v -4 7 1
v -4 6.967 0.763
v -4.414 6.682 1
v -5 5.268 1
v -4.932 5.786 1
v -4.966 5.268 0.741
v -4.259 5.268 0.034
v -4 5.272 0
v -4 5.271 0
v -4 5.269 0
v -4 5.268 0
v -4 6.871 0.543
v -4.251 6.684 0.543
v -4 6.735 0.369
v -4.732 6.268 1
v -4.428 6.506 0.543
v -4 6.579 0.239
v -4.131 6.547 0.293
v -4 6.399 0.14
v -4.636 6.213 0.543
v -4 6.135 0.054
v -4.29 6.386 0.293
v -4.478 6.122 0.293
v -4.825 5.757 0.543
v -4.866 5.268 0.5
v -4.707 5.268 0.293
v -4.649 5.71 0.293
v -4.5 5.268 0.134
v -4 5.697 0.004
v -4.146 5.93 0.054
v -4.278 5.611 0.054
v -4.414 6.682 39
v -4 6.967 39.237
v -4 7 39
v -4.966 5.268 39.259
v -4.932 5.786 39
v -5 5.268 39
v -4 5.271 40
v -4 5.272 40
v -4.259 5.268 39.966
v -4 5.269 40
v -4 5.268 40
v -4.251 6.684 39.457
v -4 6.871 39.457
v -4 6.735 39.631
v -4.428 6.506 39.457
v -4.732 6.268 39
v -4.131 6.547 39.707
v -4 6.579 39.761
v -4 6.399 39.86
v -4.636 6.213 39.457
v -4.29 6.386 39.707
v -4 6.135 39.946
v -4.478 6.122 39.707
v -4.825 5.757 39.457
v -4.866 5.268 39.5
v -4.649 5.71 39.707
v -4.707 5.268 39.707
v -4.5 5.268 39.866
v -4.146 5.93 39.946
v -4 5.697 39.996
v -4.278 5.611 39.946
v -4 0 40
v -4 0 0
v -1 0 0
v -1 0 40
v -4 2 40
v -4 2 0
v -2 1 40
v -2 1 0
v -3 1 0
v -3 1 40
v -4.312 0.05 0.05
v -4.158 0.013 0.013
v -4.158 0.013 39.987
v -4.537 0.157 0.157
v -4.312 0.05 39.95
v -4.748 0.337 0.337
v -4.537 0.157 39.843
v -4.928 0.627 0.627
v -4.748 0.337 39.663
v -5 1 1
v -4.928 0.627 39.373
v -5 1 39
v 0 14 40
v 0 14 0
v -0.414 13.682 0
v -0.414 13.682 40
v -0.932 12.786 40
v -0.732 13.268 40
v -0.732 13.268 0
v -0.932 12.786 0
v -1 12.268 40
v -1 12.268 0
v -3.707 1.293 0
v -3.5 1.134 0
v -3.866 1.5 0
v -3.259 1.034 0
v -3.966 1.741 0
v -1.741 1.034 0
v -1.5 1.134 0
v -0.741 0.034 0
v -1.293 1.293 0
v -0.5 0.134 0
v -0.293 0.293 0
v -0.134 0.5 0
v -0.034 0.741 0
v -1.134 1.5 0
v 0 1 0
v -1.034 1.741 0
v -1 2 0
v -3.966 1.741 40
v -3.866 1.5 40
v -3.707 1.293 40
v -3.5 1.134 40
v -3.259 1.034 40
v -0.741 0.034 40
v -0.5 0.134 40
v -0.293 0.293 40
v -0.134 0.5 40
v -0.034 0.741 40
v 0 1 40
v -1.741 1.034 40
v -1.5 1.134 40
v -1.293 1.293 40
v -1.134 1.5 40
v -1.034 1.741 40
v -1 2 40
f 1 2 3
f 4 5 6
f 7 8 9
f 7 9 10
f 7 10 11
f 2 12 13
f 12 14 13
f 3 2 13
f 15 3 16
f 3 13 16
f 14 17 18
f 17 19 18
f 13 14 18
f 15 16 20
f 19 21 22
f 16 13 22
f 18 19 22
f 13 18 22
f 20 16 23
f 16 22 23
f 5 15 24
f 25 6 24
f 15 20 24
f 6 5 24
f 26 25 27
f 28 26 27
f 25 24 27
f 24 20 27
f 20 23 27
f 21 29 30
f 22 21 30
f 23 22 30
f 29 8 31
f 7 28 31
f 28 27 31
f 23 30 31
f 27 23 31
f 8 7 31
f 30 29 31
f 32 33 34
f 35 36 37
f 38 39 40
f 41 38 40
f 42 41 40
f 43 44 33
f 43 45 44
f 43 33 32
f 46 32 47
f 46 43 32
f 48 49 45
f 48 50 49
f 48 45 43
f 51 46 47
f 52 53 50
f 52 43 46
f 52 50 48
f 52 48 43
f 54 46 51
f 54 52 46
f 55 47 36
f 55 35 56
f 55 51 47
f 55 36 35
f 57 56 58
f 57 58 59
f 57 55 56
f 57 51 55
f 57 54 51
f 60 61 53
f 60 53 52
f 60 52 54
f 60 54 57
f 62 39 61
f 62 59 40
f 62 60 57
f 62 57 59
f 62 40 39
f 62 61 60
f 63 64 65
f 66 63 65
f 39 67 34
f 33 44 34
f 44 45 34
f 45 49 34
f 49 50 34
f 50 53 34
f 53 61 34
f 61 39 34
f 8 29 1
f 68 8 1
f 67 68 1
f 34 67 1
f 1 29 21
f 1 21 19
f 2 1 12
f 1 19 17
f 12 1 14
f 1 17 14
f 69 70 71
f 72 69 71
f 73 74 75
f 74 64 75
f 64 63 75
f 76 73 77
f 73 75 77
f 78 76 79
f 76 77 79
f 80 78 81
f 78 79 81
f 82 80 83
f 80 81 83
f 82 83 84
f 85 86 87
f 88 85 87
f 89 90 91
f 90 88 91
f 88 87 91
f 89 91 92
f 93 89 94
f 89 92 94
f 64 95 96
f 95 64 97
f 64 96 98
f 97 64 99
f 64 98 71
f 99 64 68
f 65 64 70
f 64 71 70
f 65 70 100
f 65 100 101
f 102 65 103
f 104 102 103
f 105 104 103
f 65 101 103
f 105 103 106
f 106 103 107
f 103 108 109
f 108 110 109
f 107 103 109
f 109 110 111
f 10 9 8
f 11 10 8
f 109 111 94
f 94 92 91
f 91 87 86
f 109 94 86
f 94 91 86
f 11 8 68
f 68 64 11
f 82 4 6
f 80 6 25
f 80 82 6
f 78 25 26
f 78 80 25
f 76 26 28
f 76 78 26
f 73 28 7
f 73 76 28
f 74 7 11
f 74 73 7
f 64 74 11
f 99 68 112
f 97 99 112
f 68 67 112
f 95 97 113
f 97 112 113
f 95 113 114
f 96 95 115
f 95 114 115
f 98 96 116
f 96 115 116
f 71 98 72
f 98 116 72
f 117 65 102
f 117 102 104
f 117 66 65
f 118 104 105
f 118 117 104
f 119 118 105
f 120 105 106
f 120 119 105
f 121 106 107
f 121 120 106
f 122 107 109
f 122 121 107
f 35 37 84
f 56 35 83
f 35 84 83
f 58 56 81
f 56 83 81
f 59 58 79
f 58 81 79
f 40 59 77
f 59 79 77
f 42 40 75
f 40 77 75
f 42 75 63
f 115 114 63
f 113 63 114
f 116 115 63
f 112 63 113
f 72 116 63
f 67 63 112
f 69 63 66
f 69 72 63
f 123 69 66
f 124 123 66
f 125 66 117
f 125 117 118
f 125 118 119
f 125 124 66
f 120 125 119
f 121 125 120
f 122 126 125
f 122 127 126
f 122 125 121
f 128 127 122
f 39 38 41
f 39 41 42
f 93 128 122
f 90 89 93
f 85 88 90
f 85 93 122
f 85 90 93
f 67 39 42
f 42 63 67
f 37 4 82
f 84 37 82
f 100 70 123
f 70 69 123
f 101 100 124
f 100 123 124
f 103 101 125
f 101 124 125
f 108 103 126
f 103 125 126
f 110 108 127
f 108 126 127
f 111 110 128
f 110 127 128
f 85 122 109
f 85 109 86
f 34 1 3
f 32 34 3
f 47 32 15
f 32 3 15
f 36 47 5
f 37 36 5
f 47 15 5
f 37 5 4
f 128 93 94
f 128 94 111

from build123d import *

# Parameters (mm, degrees)
F1_DEPTH    = 40
F2_T1_DEPTH = 48.6602540378
F3_R        = 0.99999


# Not quite as in the source:
# - a fillet or chamfer that OpenCascade refuses, or shapes differently, is made with other operations: its cross-section is extruded or revolved along the edge and cut away or added
# - a fillet or chamfer is up to 0.001 mm smaller than in the source, because OpenCascade refuses the exact size


with BuildPart() as f1:
    # F0 (on Top) → F1 (new body)
    with BuildSketch(Plane.XY):
        Polygon((-5, 0), (0, 0), (0, 14), (-1, 14), (-1, 1), (-4, 1), (-4, 7), (-5, 7), align=None)
    extrude(amount=F1_DEPTH)

    # F2: fillet of radius 2 on 2 edges, made by hand

    # F2_s2 → F2_t1 (cut)
    with BuildSketch(Plane.XY.offset(-4.3301270189)):
        with BuildLine():
            ThreePointArc((-4, 7), (-4.7320508076, 6.2679491924), (-5, 5.2679491924))
            Line((-5, 5.2679491924), (-5, 7))
            Line((-5, 7), (-4, 7))
        make_face()
        with BuildLine():
            ThreePointArc((0, 14), (-0.7320508076, 13.2679491924), (-1, 12.2679491924))
            Line((-1, 12.2679491924), (-1, 14))
            Line((-1, 14), (0, 14))
        make_face()
    extrude(amount=F2_T1_DEPTH, mode=Mode.SUBTRACT)

    # F3 (radius 1 in the source; OpenCascade refuses exactly that, so slightly less here)
    f3_edges = [f1.edges().sort_by_distance(p)[0] for p in [
        (-5, 2.633975, 40),
        (-5, 2.633975, 0),
        (-5, 0, 20),
        (0, 0, 20),
        (-4, 1, 20),
        (-1, 1, 20),
        (-4.732051, 6.267949, 0),
        (-4.732051, 6.267949, 40),
    ]]
    fillet(f3_edges, radius=F3_R)


solid = f1.part
